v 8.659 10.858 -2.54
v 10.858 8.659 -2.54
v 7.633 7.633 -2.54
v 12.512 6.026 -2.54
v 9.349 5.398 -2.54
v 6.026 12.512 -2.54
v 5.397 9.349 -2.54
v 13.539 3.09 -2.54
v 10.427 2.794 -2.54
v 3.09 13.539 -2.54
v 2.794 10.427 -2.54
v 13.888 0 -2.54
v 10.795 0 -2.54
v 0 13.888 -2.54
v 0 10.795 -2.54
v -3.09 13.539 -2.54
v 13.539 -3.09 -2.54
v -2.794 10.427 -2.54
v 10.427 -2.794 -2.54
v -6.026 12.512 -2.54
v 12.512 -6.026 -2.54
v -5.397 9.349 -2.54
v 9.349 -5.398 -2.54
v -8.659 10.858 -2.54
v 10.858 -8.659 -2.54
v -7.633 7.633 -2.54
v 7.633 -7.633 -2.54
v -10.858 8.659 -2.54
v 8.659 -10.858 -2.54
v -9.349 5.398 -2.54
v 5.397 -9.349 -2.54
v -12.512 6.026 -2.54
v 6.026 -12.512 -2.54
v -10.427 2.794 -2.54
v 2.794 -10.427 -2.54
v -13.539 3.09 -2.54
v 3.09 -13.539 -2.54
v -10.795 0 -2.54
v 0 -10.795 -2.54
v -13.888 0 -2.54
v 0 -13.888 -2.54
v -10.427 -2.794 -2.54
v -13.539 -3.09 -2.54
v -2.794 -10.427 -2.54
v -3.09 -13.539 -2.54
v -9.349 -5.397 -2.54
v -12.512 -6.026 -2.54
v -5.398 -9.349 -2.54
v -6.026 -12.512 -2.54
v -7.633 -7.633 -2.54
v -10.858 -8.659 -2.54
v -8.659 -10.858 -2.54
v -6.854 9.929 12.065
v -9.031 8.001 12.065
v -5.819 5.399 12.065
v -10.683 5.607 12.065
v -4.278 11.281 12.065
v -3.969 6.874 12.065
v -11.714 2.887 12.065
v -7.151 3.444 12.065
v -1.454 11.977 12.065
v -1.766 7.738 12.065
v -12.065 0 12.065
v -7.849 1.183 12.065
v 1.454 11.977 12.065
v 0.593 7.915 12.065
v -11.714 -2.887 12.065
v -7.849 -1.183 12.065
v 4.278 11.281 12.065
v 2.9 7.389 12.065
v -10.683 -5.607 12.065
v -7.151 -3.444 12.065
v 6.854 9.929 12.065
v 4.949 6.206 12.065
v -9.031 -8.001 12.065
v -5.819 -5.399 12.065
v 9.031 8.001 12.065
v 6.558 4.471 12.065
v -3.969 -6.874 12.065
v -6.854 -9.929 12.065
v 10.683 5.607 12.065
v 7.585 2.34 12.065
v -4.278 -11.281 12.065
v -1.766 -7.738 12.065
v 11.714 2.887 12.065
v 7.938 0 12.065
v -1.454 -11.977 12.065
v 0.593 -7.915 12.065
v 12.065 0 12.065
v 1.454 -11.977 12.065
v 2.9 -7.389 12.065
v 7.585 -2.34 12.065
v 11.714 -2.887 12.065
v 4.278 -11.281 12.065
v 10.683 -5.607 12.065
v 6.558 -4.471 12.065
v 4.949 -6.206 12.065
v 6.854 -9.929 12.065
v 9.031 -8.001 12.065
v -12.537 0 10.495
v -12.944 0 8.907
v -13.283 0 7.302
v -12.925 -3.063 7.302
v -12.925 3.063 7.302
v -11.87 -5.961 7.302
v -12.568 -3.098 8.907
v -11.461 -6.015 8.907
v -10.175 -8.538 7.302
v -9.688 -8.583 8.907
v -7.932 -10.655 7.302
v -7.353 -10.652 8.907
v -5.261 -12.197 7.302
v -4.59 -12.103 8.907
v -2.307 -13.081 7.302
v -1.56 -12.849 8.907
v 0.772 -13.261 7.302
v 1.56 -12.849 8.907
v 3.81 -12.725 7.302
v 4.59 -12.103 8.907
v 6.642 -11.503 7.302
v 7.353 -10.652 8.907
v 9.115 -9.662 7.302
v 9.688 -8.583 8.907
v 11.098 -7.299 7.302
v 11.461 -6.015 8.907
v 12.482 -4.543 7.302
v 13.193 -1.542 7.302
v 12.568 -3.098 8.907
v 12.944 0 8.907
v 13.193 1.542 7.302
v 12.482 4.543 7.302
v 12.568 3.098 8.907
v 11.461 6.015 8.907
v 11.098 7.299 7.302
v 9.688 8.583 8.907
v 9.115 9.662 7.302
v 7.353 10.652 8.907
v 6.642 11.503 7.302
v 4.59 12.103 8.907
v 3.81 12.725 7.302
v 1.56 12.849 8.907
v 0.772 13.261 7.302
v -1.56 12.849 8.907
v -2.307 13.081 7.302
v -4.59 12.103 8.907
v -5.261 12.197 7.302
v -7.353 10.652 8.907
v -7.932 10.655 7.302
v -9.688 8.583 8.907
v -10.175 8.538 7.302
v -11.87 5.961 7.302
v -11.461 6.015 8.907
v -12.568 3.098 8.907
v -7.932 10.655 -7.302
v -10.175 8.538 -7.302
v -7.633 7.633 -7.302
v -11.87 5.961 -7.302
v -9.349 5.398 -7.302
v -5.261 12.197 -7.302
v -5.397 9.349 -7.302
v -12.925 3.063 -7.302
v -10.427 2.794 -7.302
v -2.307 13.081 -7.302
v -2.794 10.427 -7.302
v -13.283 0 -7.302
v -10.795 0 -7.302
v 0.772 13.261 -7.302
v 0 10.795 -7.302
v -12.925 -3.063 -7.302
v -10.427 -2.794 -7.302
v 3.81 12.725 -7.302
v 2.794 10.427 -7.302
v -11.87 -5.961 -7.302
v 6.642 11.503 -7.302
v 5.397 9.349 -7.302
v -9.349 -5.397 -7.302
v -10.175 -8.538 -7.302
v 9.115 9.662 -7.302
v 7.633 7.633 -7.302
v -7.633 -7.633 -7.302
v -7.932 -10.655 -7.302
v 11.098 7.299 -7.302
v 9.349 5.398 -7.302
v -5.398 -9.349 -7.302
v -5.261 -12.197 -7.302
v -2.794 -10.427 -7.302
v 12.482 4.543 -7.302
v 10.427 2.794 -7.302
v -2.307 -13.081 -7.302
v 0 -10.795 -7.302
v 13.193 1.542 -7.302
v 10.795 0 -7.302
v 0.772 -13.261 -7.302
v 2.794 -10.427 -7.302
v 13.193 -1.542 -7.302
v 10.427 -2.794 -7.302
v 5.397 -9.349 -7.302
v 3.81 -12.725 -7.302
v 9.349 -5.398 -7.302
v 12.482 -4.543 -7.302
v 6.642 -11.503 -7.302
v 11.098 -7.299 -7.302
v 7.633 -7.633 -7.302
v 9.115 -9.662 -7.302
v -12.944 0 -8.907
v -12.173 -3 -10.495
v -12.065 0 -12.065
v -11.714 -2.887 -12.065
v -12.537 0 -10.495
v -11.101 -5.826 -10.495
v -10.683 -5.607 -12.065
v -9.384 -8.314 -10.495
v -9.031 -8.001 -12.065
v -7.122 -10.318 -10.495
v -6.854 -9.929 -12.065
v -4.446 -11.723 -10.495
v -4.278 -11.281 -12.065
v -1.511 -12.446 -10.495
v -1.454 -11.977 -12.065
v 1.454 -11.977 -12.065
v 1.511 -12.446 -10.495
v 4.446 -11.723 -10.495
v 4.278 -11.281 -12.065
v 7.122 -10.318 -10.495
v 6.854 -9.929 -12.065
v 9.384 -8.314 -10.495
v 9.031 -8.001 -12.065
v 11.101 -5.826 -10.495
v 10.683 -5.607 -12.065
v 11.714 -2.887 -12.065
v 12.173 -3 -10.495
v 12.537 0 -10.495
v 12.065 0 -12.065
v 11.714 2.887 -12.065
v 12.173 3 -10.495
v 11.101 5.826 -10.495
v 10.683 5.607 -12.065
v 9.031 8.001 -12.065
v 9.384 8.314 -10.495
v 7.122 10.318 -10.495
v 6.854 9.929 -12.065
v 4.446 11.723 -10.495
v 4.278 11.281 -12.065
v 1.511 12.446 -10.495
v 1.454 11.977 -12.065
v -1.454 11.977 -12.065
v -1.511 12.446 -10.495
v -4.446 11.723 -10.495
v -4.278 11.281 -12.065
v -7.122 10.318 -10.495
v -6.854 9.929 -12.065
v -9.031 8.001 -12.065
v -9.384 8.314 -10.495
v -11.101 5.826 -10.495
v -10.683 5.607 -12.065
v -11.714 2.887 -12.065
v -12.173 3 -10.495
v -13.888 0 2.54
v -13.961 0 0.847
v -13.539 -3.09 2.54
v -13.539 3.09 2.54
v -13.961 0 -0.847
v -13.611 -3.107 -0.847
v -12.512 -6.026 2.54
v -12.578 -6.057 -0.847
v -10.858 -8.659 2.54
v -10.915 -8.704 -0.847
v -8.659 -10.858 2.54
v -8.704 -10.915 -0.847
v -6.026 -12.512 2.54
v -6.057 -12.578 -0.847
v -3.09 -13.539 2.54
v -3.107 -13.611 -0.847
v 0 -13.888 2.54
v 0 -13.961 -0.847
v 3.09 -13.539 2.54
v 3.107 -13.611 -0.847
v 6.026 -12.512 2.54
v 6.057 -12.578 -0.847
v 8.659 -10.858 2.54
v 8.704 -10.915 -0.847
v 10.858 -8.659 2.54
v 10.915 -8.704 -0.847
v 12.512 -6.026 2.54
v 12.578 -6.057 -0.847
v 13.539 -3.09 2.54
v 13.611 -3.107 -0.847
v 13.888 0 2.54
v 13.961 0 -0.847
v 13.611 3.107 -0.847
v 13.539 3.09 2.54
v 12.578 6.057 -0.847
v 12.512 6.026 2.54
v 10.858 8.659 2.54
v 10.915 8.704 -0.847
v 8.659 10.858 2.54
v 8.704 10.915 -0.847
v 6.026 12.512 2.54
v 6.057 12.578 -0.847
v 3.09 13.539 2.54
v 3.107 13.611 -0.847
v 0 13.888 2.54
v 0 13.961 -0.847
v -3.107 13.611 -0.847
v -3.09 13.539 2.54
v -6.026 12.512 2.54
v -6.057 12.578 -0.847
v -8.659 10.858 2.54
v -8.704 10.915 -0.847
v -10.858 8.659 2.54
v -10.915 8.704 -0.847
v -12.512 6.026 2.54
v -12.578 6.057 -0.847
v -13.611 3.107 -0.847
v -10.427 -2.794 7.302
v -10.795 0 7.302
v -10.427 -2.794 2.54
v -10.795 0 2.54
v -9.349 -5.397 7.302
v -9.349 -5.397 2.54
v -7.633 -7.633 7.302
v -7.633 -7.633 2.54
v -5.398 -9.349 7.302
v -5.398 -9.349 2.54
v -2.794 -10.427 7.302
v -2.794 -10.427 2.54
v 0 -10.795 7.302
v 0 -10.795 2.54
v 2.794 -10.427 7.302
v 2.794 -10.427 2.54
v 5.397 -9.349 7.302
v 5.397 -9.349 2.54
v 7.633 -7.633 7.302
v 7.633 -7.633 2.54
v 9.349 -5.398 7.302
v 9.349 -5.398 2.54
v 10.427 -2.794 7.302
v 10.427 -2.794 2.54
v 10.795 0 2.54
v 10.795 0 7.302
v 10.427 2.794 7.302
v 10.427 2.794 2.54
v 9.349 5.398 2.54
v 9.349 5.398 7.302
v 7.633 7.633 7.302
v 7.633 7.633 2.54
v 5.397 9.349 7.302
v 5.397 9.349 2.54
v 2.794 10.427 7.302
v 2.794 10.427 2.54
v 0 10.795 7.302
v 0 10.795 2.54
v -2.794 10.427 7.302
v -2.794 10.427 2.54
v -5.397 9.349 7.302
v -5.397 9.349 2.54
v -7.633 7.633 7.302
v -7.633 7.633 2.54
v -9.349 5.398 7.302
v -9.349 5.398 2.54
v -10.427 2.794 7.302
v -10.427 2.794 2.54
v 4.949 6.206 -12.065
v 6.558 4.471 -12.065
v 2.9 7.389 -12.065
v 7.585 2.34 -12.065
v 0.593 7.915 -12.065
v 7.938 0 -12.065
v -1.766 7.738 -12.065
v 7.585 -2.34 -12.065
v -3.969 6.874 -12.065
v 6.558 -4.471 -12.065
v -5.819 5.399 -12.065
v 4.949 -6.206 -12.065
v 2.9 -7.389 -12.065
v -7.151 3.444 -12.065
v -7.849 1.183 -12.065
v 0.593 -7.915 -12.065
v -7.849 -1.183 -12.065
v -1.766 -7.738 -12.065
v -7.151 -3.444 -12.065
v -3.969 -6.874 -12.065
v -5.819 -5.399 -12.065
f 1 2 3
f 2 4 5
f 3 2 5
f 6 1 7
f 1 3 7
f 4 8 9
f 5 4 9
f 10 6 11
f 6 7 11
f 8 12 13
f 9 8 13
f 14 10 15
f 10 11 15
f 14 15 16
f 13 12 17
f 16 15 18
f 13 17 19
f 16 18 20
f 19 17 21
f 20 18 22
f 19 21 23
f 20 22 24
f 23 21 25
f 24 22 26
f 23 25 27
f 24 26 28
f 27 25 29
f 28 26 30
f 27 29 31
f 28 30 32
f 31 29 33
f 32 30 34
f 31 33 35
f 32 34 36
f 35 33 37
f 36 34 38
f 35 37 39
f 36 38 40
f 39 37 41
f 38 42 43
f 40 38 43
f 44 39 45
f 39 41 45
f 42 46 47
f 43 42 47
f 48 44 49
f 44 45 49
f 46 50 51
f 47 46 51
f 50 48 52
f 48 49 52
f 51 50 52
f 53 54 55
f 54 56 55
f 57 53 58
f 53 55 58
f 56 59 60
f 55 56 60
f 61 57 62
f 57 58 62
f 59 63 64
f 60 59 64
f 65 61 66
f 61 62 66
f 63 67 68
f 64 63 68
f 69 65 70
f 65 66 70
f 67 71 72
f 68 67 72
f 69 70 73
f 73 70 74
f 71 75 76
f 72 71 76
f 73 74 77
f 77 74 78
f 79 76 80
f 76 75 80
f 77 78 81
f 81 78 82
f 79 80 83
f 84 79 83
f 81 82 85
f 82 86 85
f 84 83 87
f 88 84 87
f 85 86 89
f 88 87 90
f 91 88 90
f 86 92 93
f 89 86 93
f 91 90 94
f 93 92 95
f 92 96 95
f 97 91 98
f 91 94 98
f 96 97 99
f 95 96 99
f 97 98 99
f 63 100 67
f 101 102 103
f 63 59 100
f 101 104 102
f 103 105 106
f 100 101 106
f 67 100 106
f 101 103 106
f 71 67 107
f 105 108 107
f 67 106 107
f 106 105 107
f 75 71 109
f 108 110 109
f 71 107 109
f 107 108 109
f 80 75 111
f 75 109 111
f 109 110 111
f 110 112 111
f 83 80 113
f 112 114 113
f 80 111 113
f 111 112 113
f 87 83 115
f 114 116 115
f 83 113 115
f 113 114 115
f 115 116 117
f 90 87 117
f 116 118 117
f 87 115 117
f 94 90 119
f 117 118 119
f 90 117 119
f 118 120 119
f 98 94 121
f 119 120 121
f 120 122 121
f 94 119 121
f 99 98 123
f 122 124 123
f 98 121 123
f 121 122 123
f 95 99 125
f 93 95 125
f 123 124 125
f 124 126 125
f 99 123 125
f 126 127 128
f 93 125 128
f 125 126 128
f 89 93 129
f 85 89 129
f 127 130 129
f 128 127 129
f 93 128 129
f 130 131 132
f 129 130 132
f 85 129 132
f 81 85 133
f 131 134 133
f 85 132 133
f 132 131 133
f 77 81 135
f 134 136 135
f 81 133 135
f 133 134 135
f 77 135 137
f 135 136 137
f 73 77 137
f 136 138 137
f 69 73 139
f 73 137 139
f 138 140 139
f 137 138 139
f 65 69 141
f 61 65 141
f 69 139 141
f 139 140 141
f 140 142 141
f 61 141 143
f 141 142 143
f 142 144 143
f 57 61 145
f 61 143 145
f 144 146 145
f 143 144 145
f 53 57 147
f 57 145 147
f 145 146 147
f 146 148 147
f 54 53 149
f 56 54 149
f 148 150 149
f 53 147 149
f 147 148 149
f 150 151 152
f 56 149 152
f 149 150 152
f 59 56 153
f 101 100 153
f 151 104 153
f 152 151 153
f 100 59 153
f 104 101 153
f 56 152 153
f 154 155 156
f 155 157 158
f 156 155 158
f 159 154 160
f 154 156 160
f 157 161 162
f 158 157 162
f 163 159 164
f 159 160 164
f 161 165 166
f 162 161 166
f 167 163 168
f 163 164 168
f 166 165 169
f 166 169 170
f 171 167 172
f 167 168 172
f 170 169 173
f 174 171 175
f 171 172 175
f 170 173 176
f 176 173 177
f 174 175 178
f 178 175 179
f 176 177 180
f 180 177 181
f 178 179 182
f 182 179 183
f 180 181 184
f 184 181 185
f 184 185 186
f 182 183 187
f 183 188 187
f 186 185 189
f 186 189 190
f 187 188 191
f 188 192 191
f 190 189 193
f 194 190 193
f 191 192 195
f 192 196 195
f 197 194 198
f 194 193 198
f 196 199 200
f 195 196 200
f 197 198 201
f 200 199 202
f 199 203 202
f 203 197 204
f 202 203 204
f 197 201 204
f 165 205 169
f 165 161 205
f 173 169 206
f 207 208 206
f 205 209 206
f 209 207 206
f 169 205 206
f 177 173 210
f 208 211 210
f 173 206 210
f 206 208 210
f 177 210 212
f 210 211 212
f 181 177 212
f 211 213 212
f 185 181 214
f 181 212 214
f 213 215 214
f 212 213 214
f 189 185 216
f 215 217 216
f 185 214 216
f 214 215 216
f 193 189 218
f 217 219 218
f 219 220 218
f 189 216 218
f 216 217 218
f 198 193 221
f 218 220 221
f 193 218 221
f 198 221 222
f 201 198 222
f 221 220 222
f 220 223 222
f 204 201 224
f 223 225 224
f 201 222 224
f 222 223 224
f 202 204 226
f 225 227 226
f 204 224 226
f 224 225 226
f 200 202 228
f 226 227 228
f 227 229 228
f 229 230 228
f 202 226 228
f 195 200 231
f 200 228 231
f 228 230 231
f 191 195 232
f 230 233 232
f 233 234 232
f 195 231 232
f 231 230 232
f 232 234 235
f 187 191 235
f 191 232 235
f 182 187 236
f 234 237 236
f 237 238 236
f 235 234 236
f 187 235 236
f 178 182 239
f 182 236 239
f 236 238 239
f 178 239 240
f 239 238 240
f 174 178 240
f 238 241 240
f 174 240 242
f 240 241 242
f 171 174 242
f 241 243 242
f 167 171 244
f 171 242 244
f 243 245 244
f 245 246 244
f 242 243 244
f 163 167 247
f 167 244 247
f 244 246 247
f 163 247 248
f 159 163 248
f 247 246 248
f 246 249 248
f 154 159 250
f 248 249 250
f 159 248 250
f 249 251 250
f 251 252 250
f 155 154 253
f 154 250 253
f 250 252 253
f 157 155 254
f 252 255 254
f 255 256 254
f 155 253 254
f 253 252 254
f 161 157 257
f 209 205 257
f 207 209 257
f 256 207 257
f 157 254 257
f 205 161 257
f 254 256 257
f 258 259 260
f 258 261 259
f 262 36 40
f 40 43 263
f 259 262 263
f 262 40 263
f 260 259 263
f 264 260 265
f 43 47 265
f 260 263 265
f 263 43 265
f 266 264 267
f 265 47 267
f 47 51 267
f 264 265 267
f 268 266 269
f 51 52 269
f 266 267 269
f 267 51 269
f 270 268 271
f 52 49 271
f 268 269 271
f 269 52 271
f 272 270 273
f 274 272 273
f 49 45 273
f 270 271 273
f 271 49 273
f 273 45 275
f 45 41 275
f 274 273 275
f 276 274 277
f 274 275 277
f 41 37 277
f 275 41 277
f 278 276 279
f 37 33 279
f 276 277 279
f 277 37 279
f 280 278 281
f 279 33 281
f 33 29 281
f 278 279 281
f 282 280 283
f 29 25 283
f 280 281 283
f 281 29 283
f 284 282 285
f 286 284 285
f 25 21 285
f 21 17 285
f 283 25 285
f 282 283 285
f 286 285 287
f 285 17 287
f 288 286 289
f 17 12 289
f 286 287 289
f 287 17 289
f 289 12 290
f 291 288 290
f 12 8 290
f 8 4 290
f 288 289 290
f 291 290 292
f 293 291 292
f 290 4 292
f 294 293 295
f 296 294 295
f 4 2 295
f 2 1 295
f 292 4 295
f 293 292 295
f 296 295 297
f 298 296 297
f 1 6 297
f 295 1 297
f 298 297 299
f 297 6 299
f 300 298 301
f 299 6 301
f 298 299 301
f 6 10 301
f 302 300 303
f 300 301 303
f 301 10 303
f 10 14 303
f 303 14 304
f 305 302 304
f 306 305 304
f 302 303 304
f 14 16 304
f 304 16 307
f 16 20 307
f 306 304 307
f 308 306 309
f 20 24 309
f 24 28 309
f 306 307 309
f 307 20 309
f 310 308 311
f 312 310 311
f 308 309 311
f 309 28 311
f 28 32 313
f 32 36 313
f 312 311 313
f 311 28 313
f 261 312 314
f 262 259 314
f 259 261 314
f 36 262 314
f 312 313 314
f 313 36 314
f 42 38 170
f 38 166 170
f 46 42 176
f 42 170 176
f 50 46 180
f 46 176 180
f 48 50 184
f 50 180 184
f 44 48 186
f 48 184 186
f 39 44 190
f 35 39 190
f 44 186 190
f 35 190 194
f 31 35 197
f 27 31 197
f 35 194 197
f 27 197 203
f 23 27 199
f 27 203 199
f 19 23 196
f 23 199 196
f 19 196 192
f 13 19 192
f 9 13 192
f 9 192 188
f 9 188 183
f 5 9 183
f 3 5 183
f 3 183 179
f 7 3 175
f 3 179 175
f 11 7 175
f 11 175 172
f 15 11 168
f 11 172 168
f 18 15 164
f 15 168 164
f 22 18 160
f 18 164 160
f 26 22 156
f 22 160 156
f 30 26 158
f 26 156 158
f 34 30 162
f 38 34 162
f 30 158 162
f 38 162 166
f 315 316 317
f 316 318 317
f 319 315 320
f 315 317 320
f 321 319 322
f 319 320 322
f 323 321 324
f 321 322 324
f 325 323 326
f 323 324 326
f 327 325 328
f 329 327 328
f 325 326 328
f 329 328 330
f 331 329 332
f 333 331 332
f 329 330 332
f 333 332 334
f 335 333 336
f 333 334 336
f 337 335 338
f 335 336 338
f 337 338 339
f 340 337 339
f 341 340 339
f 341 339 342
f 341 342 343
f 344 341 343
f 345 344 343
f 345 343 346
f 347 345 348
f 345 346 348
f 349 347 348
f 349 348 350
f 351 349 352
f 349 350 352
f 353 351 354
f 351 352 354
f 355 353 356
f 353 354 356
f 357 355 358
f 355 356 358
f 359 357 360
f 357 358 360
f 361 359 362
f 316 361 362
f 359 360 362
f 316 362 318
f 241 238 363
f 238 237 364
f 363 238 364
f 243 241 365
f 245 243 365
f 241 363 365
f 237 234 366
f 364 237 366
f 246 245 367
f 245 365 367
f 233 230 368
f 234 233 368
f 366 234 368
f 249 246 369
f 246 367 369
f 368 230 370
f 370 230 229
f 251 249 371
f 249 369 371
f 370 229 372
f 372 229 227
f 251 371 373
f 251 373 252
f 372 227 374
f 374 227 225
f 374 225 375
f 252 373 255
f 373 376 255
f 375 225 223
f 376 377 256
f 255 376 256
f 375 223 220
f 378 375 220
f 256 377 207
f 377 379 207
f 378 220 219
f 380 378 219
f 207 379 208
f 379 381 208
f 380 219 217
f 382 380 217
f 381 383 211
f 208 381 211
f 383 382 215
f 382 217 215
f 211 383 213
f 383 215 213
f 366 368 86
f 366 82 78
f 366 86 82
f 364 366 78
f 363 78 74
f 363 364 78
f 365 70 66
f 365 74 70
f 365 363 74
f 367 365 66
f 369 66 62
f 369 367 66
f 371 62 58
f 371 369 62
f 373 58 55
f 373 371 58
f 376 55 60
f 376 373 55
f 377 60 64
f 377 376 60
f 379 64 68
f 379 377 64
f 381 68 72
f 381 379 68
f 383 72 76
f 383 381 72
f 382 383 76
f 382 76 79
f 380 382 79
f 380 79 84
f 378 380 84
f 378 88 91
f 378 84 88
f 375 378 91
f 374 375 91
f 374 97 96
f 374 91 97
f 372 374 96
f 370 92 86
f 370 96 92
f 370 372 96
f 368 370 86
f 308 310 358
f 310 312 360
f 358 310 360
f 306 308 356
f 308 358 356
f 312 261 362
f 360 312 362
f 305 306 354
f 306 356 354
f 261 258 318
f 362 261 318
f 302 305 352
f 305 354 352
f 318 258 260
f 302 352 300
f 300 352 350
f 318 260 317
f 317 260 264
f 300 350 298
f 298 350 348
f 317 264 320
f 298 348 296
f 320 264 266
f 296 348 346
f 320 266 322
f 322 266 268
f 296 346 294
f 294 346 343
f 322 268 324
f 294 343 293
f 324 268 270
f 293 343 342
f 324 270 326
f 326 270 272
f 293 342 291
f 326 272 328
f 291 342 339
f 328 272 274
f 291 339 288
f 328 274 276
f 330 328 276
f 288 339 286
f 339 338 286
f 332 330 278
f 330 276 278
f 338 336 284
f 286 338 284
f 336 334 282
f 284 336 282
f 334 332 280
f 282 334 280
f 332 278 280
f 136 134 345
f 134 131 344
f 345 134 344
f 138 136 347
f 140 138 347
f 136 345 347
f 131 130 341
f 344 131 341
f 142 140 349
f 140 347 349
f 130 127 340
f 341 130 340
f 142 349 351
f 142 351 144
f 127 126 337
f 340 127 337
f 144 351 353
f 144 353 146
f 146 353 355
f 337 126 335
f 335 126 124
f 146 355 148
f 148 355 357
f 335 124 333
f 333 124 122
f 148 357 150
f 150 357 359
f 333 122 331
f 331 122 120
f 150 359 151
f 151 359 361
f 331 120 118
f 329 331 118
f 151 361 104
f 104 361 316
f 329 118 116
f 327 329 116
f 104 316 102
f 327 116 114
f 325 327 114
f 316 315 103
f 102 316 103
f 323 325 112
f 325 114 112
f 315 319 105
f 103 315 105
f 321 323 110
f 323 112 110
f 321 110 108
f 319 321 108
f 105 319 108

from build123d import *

# Parameters (mm, degrees)
CUT_EXTRUDE1_DEPTH      = 24.149212362
CUT_EXTRUDE1_DEPTH_BACK = 24.149212362
SKETCH3_R               = 7.9375


with BuildPart() as part:
    # Sketch2 → Revolve1 (revolve)
    with BuildSketch(Plane(origin=(0, 0, 0), x_dir=(0, 0, -1), z_dir=(1, 0, 0)), mode=Mode.PRIVATE) as revolve1_sk:
        with BuildLine():
            Line((12.065, 0), (-12.065, 0))
            Line((-12.065, 0), (-12.065, 12.065))
            ThreePointArc((-12.065, 12.065), (-9.702882831, 12.74884018), (-7.3025, 13.283065955))
            Line((-7.3025, 13.283065955), (-7.3025, 10.795))
            Line((-7.3025, 10.795), (-2.54, 10.795))
            Line((-2.54, 10.795), (-2.54, 13.887534788))
            ThreePointArc((-2.54, 13.887534788), (0, 13.97), (2.54, 13.887534788))
            Line((2.54, 13.887534788), (2.54, 10.795))
            Line((2.54, 10.795), (7.3025, 10.795))
            Line((7.3025, 10.795), (7.3025, 13.283065955))
            ThreePointArc((7.3025, 13.283065955), (9.702882831, 12.74884018), (12.065, 12.065))
            Line((12.065, 12.065), (12.065, 0))
        make_face()
    revolve(revolve1_sk.sketch.rotate(Axis((0, 0, -12.065), (0, 0, 1)), 90), axis=Axis((0, 0, -12.065), (0, 0, 1)))

    # Sketch3 → Cut-Extrude1 (cut, two sides: drawn at the far end of the back side and taken through both)
    with BuildSketch(Plane.XY.offset(-CUT_EXTRUDE1_DEPTH_BACK)):
        Circle(SKETCH3_R)
    extrude(amount=CUT_EXTRUDE1_DEPTH + CUT_EXTRUDE1_DEPTH_BACK, mode=Mode.SUBTRACT)


solid = part.part
